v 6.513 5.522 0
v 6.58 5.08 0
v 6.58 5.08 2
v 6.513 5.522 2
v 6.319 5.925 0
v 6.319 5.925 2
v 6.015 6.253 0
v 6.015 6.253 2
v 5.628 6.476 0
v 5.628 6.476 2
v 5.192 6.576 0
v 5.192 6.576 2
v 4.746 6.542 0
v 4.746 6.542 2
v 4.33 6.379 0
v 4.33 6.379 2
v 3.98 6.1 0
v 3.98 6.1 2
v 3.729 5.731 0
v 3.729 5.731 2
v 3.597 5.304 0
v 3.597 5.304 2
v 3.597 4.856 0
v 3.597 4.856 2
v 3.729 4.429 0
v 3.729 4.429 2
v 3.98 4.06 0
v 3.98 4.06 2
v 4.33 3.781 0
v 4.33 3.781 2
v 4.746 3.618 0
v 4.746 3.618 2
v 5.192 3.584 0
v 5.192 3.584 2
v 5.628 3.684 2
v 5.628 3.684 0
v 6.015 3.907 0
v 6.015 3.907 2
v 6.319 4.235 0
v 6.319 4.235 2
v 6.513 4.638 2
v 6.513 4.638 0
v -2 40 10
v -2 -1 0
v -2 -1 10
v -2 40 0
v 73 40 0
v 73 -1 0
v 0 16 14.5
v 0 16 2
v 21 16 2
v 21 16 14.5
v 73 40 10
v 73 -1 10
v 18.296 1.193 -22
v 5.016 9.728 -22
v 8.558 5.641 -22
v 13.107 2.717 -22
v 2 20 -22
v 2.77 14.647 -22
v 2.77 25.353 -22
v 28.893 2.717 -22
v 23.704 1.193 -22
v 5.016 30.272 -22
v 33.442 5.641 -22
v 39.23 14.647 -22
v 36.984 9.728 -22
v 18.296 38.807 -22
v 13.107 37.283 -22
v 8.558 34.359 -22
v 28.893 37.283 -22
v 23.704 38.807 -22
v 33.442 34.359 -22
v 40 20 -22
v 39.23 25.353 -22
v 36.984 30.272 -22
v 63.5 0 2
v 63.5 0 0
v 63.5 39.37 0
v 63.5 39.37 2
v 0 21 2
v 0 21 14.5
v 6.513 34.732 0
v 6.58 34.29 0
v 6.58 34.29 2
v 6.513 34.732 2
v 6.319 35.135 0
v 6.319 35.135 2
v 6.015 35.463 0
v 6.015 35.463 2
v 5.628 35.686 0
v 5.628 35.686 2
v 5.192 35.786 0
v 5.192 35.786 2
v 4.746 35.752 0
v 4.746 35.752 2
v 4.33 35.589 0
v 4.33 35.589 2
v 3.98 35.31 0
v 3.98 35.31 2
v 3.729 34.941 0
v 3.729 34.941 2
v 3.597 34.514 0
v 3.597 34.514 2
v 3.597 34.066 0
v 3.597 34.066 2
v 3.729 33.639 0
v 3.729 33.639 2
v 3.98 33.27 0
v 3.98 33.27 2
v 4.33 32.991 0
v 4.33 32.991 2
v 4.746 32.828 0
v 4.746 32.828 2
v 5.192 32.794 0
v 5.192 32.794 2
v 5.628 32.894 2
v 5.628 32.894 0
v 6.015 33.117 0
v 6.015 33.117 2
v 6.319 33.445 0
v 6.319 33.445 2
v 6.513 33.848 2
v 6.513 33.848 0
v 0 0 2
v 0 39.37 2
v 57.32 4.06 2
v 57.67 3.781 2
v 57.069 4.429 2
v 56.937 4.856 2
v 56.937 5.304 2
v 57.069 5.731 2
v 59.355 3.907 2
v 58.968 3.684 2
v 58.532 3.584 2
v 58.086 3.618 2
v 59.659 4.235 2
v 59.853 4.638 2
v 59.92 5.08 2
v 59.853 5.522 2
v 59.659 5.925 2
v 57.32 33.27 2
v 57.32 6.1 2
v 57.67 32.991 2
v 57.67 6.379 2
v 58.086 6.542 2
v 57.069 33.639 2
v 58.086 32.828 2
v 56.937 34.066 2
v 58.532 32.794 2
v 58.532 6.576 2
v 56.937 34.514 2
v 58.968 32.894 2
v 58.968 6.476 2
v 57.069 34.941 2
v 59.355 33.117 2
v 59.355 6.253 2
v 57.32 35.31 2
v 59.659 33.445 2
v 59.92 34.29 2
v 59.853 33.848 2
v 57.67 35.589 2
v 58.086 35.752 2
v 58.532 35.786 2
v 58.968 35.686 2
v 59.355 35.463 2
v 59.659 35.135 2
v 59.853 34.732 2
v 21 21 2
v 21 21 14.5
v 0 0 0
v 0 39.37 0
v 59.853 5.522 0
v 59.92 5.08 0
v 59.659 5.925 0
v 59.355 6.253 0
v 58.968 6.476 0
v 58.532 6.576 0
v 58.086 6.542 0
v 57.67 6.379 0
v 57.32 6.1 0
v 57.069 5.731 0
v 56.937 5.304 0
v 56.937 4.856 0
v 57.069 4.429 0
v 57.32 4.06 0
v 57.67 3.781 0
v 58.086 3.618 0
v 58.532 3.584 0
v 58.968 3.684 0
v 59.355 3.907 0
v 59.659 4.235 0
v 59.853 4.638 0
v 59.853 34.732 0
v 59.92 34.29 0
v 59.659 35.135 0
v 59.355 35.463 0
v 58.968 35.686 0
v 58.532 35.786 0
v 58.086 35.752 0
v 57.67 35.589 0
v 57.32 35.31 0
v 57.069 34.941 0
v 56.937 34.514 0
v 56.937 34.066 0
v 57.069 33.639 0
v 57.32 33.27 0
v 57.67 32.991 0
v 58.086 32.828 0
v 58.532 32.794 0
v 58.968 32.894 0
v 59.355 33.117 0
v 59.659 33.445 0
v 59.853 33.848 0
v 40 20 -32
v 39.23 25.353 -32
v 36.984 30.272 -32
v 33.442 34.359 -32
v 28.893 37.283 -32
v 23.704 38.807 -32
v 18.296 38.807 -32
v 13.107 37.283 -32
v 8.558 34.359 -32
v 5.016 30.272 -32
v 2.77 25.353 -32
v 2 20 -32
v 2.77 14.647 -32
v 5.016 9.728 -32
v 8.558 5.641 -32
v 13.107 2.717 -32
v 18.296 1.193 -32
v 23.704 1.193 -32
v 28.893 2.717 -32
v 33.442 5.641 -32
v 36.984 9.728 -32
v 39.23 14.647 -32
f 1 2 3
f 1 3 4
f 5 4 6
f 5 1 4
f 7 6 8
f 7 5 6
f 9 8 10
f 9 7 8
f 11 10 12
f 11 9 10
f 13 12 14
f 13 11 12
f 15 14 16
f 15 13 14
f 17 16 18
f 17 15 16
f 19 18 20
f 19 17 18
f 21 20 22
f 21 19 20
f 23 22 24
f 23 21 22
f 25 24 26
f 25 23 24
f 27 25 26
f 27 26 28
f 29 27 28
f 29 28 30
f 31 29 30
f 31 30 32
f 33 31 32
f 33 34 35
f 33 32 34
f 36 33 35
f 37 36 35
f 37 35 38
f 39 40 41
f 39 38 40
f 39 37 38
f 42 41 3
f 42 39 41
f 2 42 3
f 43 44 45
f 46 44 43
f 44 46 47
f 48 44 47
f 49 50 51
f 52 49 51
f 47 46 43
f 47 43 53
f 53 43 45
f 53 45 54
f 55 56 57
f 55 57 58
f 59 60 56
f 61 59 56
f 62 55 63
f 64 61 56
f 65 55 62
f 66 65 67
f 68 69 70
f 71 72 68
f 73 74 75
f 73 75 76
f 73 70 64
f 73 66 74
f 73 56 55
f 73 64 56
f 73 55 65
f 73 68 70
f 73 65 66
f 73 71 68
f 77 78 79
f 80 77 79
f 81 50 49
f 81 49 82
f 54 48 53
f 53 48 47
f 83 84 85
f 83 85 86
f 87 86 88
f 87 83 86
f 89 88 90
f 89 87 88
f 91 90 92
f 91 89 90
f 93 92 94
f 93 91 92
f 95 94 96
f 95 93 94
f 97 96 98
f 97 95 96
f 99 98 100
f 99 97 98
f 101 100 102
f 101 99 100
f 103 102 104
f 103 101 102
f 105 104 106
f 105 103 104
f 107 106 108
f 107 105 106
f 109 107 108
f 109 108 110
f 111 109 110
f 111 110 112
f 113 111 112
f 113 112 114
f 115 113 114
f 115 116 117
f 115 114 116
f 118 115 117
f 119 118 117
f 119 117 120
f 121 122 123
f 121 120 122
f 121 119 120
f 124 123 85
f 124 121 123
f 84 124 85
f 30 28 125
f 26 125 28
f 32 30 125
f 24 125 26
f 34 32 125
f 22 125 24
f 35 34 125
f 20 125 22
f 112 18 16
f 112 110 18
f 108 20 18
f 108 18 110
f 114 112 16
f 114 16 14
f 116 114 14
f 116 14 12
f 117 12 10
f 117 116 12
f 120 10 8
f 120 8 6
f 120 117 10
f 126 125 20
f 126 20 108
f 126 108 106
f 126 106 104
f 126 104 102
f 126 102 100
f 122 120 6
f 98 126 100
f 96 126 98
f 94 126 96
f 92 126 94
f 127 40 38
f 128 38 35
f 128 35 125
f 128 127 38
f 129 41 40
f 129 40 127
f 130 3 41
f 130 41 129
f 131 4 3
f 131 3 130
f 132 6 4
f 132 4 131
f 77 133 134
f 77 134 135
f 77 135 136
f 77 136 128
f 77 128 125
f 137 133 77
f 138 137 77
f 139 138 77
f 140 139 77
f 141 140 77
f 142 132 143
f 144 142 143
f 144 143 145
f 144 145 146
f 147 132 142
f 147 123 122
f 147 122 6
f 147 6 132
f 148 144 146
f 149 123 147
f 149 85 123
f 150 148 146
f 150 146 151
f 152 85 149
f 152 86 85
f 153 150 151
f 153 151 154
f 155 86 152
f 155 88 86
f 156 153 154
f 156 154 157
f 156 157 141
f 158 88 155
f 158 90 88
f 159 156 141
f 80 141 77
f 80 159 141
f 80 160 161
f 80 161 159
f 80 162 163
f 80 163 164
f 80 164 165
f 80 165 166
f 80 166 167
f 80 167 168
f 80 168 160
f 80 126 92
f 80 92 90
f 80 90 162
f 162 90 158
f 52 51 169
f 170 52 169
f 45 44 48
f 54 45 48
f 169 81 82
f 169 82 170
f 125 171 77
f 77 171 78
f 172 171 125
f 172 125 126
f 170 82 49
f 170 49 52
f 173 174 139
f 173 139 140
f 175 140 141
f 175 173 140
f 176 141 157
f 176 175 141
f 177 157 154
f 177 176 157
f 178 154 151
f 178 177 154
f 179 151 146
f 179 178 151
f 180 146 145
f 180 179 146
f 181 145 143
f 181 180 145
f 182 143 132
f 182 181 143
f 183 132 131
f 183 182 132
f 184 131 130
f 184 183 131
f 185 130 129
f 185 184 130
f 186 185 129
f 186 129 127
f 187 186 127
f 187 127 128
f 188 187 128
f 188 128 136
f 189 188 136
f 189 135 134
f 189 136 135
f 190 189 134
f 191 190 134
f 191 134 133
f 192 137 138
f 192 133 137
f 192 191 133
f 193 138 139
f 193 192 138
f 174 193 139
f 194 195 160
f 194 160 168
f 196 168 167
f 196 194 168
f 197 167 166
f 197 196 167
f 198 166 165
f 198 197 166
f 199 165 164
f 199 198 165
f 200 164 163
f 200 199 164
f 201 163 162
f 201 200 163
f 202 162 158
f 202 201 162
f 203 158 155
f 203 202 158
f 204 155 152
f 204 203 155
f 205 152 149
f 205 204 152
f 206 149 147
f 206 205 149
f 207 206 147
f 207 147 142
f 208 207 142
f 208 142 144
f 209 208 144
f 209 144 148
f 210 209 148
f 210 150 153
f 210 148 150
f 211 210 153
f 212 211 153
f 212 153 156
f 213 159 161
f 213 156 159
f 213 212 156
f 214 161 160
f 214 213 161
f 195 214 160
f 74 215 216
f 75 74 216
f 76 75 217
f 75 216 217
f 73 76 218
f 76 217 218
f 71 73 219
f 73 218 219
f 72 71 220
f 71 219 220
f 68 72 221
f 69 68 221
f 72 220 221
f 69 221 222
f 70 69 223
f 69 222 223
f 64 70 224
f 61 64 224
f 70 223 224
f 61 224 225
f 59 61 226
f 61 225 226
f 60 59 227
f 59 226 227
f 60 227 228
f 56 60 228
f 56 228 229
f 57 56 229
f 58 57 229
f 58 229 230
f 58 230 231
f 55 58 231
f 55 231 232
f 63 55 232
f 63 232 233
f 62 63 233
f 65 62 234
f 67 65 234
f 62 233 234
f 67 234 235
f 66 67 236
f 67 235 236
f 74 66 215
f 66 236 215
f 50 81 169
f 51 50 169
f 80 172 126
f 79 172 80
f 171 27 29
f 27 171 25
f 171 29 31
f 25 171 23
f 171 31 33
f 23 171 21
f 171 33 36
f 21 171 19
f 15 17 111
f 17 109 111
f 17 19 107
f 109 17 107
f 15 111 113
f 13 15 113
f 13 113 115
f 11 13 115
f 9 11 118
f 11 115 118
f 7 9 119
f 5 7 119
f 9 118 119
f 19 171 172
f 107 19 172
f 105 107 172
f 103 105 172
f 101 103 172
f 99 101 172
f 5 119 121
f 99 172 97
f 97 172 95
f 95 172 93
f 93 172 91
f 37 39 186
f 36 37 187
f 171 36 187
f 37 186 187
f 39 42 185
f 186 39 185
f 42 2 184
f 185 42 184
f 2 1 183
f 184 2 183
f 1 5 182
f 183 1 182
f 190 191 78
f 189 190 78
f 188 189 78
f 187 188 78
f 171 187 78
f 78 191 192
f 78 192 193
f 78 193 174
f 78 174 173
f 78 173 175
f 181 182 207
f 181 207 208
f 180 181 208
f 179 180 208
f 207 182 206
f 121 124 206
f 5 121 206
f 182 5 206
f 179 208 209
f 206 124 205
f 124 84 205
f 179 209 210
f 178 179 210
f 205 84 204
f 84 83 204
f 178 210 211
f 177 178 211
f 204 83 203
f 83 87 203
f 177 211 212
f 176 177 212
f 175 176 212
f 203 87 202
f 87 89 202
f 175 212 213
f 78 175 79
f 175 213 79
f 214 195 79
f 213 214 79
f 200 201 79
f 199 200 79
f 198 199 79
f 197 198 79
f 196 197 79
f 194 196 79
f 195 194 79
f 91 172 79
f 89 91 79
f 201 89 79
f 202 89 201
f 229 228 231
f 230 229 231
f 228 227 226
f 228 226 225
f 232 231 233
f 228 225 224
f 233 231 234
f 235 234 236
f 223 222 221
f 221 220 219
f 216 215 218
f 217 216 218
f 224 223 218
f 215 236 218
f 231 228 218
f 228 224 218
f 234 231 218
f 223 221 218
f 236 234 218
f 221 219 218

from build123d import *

# Parameters (mm, degrees)
BOX001_W          = 21
BOX001_H          = 5
BOX001_DEPTH      = 12.5
CYLINDER003_R     = 1.5
CYLINDER003_DEPTH = 10
CYLINDER001_R     = 1.5
CYLINDER001_DEPTH = 10
CYLINDER002_R     = 1.5
CYLINDER002_DEPTH = 10
CYLINDER_R        = 1.5
CYLINDER_DEPTH    = 10
BOX_W             = 63.5
BOX_H             = 39.37
BOX_DEPTH         = 2
BOX002_W          = 75
BOX002_H          = 41
BOX002_DEPTH      = 10
CYLINDER004_R     = 19
CYLINDER004_DEPTH = 10


with BuildPart() as cube001:
    # Box001 → Box001 (new body)
    with BuildSketch(Plane(origin=(0, 16, 2), x_dir=(1, 0, 0), z_dir=(0, 0, 1))):
        with Locations((10.5, 2.5)):
            Rectangle(BOX001_W, BOX001_H)
    extrude(amount=BOX001_DEPTH)


with BuildPart() as cylinder003:
    # Cylinder003 → Cylinder003 (new body)
    with BuildSketch(Plane(origin=(58.42, 34.29, -2), x_dir=(1, 0, 0), z_dir=(0, 0, 1))):
        Circle(CYLINDER003_R)
    extrude(amount=CYLINDER003_DEPTH)


with BuildPart() as fusion001:
    # Cylinder001 → Cylinder001 (new body)
    with BuildSketch(Plane(origin=(5.08, 34.29, -2), x_dir=(1, 0, 0), z_dir=(0, 0, 1))):
        Circle(CYLINDER001_R)
    extrude(amount=CYLINDER001_DEPTH)

    # Fusion001: union Cylinder003
    add(cylinder003.part)


with BuildPart() as cylinder002:
    # Cylinder002 → Cylinder002 (new body)
    with BuildSketch(Plane(origin=(58.42, 5.08, -2), x_dir=(1, 0, 0), z_dir=(0, 0, 1))):
        Circle(CYLINDER002_R)
    extrude(amount=CYLINDER002_DEPTH)


with BuildPart() as fusion002:
    # Cylinder → Cylinder (new body)
    with BuildSketch(Plane(origin=(5.08, 5.08, -2), x_dir=(1, 0, 0), z_dir=(0, 0, 1))):
        Circle(CYLINDER_R)
    extrude(amount=CYLINDER_DEPTH)

    # Fusion: union Cylinder002
    add(cylinder002.part)

    # Fusion002: union Fusion001
    add(fusion001.part)


with BuildPart() as cut:
    # Box → Box (new body)
    with BuildSketch(Plane.XY):
        with Locations((31.75, 19.685)):
            Rectangle(BOX_W, BOX_H)
    extrude(amount=BOX_DEPTH)

    # Cut: cut Fusion002
    add(fusion002.part, mode=Mode.SUBTRACT)


with BuildPart() as cube002:
    # Box002 → Box002 (new body)
    with BuildSketch(Plane(origin=(-2, -1, 0), x_dir=(1, 0, 0), z_dir=(0, 0, 1))):
        with Locations((37.5, 20.5)):
            Rectangle(BOX002_W, BOX002_H)
    extrude(amount=BOX002_DEPTH)


with BuildPart() as cylinder004:
    # Cylinder004 → Cylinder004 (new body)
    with BuildSketch(Plane(origin=(21, 20, -32), x_dir=(1, 0, 0), z_dir=(0, 0, 1))):
        Circle(CYLINDER004_R)
    extrude(amount=CYLINDER004_DEPTH)


solid = Compound([cube001.part, cut.part, cube002.part, cylinder004.part])
